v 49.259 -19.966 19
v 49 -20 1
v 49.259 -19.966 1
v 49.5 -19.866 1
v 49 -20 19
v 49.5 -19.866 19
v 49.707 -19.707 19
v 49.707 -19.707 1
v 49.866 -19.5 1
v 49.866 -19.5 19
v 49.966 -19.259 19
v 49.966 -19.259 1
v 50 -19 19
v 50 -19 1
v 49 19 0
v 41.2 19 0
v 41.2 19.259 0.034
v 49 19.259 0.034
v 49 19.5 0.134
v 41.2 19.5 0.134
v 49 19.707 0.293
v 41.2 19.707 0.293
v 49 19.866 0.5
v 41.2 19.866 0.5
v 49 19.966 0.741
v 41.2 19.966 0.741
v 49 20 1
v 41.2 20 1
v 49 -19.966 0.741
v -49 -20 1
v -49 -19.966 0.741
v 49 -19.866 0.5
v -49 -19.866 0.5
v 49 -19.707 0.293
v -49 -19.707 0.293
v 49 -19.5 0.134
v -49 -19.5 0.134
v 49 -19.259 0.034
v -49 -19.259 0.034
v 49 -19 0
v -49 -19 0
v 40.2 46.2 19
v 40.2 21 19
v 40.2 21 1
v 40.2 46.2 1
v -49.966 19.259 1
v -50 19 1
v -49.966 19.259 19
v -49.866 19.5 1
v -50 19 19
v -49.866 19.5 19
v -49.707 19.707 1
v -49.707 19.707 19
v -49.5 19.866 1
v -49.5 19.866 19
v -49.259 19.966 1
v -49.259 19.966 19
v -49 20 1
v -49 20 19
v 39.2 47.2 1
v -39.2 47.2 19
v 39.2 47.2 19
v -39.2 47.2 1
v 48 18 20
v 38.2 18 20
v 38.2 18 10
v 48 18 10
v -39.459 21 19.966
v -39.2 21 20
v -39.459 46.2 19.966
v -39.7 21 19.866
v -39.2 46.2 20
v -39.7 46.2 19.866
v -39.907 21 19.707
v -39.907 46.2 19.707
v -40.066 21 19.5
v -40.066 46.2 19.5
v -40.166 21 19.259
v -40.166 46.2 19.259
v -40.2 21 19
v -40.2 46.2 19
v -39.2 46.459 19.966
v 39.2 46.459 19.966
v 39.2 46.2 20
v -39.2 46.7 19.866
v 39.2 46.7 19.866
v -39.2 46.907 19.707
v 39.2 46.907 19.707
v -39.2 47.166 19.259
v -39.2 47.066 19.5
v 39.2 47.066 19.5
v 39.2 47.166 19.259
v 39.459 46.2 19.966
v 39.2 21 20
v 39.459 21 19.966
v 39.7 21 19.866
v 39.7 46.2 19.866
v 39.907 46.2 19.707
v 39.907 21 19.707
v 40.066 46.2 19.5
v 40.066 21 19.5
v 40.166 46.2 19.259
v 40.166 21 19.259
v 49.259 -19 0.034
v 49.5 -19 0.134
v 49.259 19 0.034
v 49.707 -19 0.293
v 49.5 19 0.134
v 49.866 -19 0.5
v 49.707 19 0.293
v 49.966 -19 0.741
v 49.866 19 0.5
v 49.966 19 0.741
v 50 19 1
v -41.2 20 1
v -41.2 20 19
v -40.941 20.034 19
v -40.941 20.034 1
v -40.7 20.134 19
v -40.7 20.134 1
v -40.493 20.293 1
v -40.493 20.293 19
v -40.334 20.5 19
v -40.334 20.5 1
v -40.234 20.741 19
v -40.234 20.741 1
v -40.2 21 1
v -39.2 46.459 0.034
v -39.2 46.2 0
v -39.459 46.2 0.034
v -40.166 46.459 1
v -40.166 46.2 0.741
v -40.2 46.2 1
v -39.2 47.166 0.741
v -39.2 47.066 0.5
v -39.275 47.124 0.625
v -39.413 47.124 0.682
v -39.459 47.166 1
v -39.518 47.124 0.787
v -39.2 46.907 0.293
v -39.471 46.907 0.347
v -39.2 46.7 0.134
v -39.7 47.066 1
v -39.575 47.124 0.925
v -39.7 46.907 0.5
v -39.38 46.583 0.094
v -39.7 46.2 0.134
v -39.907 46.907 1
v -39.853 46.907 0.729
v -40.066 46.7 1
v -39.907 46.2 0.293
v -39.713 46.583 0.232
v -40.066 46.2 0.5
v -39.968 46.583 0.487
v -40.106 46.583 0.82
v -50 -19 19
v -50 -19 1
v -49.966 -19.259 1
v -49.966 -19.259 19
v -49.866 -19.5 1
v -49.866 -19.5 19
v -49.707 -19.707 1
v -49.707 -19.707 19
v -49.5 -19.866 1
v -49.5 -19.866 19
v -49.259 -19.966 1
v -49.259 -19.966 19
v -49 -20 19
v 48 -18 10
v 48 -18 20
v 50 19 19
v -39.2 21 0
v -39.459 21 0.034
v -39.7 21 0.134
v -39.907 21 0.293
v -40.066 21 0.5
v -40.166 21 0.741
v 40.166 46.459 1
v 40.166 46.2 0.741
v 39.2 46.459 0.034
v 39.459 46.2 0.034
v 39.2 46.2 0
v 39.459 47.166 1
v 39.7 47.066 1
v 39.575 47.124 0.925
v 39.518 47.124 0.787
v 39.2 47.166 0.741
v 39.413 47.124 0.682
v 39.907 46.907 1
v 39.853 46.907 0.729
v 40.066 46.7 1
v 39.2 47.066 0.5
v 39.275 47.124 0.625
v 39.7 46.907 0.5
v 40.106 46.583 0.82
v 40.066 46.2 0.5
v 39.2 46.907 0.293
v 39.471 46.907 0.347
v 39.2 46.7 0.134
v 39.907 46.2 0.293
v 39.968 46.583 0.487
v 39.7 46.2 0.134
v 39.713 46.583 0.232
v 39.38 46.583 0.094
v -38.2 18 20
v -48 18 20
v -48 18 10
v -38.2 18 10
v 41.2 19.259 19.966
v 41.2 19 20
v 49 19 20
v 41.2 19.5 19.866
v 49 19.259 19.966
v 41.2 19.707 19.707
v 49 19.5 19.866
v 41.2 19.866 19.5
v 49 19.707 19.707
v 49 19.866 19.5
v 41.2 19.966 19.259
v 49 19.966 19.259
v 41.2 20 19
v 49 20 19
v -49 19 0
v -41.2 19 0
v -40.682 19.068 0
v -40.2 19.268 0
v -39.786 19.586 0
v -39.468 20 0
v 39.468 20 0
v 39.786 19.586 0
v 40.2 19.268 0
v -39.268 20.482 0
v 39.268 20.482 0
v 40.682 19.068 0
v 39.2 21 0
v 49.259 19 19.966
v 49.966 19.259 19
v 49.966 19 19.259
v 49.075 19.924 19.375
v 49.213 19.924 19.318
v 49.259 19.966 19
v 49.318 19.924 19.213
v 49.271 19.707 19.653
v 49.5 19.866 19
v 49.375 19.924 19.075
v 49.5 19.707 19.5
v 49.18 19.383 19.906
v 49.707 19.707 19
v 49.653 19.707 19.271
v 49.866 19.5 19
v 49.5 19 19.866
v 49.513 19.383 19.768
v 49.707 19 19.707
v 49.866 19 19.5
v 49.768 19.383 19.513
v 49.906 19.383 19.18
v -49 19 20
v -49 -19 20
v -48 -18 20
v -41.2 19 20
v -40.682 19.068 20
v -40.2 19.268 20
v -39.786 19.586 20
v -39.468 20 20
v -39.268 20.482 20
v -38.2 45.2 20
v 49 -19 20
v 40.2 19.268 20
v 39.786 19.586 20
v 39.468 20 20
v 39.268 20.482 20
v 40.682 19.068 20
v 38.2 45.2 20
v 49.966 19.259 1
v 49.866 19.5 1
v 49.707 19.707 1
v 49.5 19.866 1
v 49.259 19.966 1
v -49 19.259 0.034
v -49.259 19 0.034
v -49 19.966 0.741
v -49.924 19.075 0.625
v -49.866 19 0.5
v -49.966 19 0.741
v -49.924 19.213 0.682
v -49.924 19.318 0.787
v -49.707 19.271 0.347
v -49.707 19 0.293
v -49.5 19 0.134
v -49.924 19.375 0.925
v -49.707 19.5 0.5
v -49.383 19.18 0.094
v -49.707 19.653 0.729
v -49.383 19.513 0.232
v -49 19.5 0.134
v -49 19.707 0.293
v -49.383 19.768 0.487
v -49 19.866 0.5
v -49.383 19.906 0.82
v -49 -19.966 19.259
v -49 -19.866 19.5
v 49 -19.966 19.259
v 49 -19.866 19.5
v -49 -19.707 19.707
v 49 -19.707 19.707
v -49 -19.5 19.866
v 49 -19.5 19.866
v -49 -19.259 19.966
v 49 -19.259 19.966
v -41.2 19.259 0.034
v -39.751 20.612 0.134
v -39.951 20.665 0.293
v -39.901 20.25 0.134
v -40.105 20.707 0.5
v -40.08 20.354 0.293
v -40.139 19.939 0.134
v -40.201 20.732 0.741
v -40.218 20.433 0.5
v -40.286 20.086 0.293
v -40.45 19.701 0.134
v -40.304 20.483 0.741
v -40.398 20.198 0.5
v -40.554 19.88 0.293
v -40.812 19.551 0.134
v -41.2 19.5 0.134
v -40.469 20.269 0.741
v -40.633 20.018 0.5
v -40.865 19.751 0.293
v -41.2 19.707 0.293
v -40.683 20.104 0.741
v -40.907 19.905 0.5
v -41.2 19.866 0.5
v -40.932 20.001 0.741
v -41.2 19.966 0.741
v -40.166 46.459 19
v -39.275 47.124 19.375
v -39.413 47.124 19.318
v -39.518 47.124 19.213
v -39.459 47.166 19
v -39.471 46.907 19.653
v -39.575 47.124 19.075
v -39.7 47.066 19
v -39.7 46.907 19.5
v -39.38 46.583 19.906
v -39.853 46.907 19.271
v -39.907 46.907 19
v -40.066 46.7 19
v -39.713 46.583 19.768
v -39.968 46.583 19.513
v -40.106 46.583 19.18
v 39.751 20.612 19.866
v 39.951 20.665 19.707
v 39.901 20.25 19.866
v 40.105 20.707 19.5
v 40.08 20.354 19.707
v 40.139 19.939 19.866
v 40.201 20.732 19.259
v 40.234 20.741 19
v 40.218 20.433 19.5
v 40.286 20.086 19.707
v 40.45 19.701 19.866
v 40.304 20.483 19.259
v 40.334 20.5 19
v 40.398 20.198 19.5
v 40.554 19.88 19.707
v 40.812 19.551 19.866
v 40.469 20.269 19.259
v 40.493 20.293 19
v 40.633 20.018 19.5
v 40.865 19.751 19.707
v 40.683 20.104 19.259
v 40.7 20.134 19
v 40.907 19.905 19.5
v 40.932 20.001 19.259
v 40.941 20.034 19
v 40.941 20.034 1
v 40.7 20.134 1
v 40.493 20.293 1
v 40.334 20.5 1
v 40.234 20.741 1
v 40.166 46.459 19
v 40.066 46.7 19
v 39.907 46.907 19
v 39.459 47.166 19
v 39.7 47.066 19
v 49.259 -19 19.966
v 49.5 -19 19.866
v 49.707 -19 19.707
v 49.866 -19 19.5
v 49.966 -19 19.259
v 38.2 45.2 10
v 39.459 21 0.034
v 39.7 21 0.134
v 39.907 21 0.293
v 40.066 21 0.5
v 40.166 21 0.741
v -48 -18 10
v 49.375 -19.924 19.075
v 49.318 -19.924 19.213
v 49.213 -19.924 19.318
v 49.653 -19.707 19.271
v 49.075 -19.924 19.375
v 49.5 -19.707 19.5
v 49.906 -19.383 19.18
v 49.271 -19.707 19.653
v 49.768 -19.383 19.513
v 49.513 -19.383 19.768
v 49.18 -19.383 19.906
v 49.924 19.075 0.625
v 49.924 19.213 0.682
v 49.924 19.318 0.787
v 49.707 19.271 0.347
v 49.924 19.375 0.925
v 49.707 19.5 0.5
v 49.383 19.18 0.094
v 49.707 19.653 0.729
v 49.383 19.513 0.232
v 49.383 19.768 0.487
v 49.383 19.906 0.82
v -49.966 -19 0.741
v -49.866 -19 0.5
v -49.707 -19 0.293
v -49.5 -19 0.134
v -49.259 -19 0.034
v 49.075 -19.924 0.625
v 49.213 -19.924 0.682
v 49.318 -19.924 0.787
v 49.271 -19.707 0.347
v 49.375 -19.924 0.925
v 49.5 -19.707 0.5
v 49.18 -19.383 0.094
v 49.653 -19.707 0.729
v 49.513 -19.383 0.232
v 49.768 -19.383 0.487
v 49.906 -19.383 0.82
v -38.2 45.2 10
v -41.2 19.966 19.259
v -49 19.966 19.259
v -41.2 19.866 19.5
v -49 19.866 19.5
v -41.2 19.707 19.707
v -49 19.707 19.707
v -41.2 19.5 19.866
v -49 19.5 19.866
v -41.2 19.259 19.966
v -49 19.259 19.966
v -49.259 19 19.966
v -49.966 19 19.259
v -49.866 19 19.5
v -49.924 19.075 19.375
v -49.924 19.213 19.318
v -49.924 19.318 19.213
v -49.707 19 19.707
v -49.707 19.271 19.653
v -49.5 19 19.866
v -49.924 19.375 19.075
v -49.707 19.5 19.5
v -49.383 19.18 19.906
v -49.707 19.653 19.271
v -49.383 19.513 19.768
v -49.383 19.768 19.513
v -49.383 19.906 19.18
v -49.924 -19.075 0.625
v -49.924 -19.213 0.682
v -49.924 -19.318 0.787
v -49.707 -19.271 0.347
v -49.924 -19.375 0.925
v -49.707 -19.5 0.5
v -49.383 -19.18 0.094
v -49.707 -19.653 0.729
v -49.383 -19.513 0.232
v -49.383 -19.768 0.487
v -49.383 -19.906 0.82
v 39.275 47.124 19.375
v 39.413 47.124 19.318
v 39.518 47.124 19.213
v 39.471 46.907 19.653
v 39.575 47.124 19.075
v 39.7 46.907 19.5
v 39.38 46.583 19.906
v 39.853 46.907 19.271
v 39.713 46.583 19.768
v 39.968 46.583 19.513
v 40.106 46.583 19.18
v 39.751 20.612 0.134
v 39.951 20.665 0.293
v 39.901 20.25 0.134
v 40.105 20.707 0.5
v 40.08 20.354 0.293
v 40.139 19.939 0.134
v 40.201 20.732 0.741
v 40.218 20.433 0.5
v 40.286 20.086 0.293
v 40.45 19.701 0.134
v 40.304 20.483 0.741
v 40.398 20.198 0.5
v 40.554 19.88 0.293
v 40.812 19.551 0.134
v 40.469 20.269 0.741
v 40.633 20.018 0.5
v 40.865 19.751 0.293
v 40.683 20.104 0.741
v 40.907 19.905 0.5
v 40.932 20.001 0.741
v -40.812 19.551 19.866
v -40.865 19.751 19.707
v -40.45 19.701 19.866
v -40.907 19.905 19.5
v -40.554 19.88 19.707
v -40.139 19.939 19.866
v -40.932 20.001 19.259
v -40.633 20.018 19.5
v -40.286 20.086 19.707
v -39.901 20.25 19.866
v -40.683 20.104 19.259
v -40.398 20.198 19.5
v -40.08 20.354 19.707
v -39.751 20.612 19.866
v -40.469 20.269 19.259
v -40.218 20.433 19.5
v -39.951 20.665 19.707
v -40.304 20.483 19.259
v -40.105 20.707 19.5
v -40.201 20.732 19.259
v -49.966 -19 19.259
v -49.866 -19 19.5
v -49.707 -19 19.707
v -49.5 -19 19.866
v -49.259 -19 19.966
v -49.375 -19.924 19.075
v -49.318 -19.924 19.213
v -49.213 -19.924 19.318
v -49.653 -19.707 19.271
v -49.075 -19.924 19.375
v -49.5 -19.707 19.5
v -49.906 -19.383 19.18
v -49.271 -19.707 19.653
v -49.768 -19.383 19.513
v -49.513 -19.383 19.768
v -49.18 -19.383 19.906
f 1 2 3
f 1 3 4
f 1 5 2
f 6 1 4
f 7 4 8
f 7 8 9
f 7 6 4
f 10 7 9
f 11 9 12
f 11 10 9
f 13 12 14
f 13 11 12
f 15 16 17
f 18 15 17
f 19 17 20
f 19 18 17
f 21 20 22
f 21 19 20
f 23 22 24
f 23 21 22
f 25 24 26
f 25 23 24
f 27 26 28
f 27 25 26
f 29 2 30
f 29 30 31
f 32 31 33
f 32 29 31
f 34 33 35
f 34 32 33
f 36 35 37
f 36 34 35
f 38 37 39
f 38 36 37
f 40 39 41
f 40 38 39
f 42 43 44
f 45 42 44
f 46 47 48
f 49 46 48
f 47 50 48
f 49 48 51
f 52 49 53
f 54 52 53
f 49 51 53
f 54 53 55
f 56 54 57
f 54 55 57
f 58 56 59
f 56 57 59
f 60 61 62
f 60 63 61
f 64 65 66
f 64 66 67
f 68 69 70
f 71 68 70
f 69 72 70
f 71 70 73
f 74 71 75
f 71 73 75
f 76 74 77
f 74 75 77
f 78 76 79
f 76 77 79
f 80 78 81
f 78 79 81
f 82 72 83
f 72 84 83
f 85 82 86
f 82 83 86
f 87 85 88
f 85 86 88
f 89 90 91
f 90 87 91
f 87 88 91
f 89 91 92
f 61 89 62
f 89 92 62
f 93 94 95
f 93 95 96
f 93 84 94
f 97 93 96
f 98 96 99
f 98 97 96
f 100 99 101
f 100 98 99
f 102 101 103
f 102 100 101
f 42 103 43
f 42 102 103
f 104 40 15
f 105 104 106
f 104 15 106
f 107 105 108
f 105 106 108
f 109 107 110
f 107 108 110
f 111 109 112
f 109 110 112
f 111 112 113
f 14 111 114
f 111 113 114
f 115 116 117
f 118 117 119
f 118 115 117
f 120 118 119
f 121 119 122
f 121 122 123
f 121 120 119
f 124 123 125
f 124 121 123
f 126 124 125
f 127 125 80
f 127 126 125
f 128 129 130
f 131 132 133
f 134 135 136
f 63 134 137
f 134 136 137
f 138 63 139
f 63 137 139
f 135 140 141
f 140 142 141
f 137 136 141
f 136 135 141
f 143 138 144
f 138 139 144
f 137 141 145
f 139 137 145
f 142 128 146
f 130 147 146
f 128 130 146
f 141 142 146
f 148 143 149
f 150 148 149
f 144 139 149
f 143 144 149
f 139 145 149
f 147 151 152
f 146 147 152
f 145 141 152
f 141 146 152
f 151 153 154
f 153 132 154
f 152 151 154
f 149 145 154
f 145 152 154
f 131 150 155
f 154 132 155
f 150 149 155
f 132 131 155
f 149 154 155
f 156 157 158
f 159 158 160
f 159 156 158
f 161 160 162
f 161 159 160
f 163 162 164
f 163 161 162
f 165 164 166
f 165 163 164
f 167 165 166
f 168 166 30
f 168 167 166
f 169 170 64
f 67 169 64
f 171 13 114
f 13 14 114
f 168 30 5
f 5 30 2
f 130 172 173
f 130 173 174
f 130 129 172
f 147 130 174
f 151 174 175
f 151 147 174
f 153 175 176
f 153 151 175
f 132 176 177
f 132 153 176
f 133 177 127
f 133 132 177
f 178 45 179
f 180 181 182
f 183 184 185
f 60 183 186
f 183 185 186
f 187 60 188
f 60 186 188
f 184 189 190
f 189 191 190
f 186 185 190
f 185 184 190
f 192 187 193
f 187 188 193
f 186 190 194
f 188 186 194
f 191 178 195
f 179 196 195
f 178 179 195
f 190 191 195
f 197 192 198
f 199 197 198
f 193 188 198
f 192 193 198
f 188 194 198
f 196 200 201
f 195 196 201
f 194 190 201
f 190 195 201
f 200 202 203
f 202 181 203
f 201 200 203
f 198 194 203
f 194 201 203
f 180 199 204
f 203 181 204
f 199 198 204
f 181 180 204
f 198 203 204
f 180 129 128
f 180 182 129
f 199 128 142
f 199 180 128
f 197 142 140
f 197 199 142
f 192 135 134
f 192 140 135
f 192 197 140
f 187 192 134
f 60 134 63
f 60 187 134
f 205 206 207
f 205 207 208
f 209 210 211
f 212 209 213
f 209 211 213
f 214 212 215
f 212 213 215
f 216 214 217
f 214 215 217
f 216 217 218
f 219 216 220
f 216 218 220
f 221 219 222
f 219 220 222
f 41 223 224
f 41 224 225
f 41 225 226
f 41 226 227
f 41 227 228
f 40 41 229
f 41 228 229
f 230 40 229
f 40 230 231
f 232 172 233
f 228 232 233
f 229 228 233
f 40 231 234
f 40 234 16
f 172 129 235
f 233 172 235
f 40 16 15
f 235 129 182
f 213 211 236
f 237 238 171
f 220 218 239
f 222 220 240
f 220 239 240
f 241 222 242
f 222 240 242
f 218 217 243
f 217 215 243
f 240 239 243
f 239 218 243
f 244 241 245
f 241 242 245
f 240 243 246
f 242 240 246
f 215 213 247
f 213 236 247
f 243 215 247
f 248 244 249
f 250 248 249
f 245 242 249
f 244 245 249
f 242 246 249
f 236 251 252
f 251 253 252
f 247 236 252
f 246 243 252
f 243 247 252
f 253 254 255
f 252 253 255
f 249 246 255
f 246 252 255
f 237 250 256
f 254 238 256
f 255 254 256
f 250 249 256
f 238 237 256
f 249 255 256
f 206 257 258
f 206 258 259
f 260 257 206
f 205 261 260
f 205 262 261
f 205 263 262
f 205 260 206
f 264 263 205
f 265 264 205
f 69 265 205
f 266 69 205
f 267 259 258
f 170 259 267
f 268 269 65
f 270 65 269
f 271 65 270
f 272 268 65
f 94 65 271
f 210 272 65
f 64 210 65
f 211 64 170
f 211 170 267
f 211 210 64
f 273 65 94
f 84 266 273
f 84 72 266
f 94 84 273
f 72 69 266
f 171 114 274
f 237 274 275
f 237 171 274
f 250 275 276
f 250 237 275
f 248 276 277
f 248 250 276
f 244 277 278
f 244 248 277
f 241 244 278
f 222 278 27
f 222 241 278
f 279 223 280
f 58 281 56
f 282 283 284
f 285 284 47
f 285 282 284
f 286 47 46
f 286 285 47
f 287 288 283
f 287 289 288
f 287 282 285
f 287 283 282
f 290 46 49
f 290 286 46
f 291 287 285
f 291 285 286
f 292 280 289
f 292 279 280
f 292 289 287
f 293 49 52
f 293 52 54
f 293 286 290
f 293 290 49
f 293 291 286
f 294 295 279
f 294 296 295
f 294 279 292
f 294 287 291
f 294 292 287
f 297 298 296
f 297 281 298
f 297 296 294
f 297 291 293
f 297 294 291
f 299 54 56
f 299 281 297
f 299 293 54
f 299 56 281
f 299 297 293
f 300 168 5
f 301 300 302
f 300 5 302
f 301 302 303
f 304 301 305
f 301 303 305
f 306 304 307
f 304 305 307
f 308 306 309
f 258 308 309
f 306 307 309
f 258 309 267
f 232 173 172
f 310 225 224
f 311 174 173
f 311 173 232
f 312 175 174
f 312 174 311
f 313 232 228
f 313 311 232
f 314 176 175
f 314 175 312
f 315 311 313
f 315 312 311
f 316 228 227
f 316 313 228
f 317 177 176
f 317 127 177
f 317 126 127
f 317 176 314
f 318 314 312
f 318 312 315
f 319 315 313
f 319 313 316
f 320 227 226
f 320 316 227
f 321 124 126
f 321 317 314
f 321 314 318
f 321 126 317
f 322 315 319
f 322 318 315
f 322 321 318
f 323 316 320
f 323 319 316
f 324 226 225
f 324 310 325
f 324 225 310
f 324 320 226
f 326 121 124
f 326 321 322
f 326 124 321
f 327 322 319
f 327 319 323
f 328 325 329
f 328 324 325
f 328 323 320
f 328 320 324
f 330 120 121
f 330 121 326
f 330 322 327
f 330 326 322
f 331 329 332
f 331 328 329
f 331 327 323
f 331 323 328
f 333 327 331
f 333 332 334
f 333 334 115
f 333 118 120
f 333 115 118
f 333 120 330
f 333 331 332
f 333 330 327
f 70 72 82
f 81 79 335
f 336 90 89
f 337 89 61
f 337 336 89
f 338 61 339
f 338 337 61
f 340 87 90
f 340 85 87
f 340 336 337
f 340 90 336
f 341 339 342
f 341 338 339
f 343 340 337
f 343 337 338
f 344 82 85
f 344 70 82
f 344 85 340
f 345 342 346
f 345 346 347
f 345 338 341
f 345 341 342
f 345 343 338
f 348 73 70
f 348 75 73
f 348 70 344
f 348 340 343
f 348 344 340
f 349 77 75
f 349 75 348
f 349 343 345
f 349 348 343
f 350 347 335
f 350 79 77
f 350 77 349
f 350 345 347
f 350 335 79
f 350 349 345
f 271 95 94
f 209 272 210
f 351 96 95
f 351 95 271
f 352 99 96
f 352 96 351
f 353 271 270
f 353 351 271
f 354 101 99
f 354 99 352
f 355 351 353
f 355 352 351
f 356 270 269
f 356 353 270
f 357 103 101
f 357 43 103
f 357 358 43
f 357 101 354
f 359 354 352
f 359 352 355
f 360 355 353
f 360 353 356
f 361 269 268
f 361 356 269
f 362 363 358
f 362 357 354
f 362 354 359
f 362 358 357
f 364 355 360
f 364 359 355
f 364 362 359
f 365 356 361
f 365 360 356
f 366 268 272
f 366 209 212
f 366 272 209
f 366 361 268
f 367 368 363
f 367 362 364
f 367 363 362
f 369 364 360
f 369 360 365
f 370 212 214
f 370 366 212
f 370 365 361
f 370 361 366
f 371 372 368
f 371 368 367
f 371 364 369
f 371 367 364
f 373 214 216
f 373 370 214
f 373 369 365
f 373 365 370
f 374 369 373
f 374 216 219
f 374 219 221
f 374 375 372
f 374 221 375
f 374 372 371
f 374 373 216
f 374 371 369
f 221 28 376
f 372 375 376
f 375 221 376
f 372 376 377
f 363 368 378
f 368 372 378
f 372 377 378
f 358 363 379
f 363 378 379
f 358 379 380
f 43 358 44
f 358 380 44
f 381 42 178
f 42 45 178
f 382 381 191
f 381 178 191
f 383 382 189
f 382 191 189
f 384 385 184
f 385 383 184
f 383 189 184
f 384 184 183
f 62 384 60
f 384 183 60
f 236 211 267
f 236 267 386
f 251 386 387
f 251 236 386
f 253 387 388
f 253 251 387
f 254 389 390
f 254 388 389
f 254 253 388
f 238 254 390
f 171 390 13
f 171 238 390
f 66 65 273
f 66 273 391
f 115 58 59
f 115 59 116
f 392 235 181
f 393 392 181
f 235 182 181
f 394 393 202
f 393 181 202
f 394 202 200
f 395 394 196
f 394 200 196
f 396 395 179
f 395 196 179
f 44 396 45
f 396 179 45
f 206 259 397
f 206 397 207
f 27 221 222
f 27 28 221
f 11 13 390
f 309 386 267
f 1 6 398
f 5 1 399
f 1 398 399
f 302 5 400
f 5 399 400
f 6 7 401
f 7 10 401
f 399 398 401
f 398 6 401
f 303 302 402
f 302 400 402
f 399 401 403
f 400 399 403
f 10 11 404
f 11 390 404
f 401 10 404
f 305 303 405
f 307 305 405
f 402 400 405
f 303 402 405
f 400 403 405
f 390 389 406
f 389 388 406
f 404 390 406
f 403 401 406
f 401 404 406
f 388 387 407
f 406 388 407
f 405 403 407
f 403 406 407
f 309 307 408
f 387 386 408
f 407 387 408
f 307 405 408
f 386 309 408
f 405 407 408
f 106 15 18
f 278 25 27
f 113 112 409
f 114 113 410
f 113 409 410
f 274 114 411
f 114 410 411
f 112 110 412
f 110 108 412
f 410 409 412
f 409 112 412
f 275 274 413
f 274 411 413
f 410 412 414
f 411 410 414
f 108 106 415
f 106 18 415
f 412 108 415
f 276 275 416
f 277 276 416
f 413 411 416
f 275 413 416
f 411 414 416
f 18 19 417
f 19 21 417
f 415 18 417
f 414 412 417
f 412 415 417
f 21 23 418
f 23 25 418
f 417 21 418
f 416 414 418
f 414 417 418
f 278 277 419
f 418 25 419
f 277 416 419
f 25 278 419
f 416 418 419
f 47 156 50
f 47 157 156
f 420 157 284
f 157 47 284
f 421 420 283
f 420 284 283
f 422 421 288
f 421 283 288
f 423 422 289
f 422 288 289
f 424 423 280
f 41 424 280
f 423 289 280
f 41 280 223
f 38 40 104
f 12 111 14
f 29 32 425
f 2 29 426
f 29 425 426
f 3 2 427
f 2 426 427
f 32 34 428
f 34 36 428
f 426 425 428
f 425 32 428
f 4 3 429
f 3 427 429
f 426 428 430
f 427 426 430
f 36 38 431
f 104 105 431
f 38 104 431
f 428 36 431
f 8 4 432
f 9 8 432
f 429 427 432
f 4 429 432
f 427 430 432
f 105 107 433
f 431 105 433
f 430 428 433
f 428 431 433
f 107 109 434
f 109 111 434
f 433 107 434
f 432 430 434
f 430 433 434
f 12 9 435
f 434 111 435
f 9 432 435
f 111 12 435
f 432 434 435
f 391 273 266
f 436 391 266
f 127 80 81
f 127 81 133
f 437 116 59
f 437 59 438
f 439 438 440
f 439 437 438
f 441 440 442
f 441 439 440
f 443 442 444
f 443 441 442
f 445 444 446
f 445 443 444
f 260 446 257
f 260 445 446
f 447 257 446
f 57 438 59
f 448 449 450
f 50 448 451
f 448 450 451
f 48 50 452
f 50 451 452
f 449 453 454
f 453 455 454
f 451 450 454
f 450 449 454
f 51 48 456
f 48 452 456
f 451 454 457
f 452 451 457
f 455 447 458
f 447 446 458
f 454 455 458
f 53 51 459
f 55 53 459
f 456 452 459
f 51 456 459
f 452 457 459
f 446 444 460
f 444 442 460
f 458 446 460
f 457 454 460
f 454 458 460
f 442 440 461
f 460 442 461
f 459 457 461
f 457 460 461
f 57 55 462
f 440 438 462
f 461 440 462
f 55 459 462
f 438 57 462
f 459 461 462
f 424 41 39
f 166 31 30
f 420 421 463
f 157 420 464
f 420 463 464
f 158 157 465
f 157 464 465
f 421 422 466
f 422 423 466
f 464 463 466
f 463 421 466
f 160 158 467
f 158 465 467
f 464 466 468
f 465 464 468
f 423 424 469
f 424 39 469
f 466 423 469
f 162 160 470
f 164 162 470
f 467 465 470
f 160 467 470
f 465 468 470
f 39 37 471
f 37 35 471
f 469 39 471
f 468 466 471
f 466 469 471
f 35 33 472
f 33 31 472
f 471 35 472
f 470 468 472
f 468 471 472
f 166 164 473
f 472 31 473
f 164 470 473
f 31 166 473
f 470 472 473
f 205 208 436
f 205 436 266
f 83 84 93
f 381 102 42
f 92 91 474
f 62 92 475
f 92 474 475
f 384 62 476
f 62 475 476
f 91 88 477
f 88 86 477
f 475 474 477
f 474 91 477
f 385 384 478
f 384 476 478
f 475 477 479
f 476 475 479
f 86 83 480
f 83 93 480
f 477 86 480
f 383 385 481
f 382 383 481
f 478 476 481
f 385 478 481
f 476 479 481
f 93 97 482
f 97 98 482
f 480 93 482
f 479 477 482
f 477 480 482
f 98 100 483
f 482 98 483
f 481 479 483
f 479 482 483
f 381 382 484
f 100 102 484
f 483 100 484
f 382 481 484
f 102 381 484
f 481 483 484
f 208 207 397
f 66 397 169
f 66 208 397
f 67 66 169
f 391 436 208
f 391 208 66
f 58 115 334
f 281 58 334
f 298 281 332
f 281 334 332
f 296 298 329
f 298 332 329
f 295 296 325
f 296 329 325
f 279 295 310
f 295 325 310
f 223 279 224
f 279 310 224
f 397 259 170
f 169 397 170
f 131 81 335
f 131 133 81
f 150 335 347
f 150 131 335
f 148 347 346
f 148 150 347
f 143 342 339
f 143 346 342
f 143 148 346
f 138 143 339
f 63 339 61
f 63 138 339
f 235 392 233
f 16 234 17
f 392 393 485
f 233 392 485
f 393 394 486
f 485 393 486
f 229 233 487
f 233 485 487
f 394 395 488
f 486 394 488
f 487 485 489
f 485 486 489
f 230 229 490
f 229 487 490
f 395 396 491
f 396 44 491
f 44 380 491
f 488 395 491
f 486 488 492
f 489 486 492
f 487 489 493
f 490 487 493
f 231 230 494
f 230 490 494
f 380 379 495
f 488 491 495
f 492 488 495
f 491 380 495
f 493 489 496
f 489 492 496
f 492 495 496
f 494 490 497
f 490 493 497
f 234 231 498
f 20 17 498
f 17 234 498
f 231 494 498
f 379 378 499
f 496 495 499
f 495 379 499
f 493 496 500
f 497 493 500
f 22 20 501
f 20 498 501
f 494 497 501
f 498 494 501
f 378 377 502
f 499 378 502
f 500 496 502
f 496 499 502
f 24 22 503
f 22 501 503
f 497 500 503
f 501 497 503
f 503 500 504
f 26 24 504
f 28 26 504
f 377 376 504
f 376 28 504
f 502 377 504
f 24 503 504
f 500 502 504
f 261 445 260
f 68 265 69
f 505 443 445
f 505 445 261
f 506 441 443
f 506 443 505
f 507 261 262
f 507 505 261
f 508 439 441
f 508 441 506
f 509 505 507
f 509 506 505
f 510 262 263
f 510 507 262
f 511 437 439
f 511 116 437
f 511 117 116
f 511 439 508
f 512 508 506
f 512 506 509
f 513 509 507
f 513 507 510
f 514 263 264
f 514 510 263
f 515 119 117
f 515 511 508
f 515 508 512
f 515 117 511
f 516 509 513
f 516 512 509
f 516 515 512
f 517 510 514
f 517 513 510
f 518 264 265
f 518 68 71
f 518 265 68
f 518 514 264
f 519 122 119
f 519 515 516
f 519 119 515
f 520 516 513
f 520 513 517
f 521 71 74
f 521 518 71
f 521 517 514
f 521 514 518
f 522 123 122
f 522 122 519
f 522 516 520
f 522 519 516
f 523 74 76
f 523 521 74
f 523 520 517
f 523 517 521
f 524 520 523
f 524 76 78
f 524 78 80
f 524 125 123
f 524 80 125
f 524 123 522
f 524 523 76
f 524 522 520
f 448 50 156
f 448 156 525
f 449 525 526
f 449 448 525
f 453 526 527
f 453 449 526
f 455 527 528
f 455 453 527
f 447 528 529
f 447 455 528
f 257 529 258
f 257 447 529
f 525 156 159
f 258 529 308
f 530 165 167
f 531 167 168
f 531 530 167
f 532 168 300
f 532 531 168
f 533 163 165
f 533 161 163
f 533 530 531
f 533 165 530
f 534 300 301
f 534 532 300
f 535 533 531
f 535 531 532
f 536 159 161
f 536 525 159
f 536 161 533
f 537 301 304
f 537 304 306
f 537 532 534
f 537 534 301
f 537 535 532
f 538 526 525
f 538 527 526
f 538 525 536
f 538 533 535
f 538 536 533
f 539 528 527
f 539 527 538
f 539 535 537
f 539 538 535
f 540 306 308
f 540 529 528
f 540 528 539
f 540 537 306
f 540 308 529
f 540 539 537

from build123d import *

# Parameters (mm, degrees)
SKETCH_1_W          = 100
SKETCH_1_H          = 40
EXTRUDE_1_DEPTH     = 20
SKETCH_2_W          = 96
SKETCH_2_H          = 36
CUT_EXTRUDE_1_DEPTH = 10
SKETCH_3_W          = 80.4
SKETCH_3_H          = 20
EXTRUDE_2_DEPTH     = 27.2
CUT_EXTRUDE_2_DEPTH = 27.2
FILLET_1_R          = 1


with BuildPart() as part:
    # Эскиз1 → Бобышка-Вытянуть1 (new body)
    with BuildSketch(Plane.XY):
        Rectangle(SKETCH_1_W, SKETCH_1_H)
    extrude(amount=EXTRUDE_1_DEPTH)

    # Эскиз2 → Вырез-Вытянуть1 (cut)
    with BuildSketch(Plane.XY.offset(20)):
        Rectangle(SKETCH_2_W, SKETCH_2_H)
    extrude(amount=-CUT_EXTRUDE_1_DEPTH, mode=Mode.SUBTRACT)

    # Эскиз3 → Бобышка-Вытянуть2 (add)
    with BuildSketch(Plane(origin=(0, 20, 0), x_dir=(1, 0, 0), z_dir=(0, 1, 0))):
        with Locations((0, -10)):
            Rectangle(SKETCH_3_W, SKETCH_3_H)
    extrude(amount=EXTRUDE_2_DEPTH)

    # Эскиз4 → Вырез-Вытянуть2 (cut)
    with BuildSketch(Plane.XZ.offset(-18)):
        Polygon((-38.2, 20), (0, 20), (38.2, 20), (38.2, 10), (-38.2, 10), align=None)
    extrude(amount=-CUT_EXTRUDE_2_DEPTH, mode=Mode.SUBTRACT)

    # Скругление1
    fillet_1_edges = [part.edges().sort_by_distance(p)[0] for p in [
        (50, 0, 20),
        (45.1, 20, 20),
        (-45.1, 20, 0),
        (-45.1, 20, 20),
        (-40.2, 33.6, 20),
        (40.2, 20, 10),
        (40.2, 33.6, 20),
        (40.2, 33.6, 0),
        (-40.2, 20, 10),
        (-40.2, 33.6, 0),
        (0, 47.2, 20),
        (40.2, 47.2, 10),
        (0, 47.2, 0),
        (-40.2, 47.2, 10),
        (-50, 0, 20),
        (45.1, 20, 0),
        (50, 0, 0),
        (0, -20, 0),
        (-50, 0, 0),
        (-50, 20, 10),
        (50, 20, 10),
        (50, -20, 10),
        (-50, -20, 10),
        (0, -20, 20),
    ]]
    fillet(fillet_1_edges, radius=FILLET_1_R)


solid = part.part
